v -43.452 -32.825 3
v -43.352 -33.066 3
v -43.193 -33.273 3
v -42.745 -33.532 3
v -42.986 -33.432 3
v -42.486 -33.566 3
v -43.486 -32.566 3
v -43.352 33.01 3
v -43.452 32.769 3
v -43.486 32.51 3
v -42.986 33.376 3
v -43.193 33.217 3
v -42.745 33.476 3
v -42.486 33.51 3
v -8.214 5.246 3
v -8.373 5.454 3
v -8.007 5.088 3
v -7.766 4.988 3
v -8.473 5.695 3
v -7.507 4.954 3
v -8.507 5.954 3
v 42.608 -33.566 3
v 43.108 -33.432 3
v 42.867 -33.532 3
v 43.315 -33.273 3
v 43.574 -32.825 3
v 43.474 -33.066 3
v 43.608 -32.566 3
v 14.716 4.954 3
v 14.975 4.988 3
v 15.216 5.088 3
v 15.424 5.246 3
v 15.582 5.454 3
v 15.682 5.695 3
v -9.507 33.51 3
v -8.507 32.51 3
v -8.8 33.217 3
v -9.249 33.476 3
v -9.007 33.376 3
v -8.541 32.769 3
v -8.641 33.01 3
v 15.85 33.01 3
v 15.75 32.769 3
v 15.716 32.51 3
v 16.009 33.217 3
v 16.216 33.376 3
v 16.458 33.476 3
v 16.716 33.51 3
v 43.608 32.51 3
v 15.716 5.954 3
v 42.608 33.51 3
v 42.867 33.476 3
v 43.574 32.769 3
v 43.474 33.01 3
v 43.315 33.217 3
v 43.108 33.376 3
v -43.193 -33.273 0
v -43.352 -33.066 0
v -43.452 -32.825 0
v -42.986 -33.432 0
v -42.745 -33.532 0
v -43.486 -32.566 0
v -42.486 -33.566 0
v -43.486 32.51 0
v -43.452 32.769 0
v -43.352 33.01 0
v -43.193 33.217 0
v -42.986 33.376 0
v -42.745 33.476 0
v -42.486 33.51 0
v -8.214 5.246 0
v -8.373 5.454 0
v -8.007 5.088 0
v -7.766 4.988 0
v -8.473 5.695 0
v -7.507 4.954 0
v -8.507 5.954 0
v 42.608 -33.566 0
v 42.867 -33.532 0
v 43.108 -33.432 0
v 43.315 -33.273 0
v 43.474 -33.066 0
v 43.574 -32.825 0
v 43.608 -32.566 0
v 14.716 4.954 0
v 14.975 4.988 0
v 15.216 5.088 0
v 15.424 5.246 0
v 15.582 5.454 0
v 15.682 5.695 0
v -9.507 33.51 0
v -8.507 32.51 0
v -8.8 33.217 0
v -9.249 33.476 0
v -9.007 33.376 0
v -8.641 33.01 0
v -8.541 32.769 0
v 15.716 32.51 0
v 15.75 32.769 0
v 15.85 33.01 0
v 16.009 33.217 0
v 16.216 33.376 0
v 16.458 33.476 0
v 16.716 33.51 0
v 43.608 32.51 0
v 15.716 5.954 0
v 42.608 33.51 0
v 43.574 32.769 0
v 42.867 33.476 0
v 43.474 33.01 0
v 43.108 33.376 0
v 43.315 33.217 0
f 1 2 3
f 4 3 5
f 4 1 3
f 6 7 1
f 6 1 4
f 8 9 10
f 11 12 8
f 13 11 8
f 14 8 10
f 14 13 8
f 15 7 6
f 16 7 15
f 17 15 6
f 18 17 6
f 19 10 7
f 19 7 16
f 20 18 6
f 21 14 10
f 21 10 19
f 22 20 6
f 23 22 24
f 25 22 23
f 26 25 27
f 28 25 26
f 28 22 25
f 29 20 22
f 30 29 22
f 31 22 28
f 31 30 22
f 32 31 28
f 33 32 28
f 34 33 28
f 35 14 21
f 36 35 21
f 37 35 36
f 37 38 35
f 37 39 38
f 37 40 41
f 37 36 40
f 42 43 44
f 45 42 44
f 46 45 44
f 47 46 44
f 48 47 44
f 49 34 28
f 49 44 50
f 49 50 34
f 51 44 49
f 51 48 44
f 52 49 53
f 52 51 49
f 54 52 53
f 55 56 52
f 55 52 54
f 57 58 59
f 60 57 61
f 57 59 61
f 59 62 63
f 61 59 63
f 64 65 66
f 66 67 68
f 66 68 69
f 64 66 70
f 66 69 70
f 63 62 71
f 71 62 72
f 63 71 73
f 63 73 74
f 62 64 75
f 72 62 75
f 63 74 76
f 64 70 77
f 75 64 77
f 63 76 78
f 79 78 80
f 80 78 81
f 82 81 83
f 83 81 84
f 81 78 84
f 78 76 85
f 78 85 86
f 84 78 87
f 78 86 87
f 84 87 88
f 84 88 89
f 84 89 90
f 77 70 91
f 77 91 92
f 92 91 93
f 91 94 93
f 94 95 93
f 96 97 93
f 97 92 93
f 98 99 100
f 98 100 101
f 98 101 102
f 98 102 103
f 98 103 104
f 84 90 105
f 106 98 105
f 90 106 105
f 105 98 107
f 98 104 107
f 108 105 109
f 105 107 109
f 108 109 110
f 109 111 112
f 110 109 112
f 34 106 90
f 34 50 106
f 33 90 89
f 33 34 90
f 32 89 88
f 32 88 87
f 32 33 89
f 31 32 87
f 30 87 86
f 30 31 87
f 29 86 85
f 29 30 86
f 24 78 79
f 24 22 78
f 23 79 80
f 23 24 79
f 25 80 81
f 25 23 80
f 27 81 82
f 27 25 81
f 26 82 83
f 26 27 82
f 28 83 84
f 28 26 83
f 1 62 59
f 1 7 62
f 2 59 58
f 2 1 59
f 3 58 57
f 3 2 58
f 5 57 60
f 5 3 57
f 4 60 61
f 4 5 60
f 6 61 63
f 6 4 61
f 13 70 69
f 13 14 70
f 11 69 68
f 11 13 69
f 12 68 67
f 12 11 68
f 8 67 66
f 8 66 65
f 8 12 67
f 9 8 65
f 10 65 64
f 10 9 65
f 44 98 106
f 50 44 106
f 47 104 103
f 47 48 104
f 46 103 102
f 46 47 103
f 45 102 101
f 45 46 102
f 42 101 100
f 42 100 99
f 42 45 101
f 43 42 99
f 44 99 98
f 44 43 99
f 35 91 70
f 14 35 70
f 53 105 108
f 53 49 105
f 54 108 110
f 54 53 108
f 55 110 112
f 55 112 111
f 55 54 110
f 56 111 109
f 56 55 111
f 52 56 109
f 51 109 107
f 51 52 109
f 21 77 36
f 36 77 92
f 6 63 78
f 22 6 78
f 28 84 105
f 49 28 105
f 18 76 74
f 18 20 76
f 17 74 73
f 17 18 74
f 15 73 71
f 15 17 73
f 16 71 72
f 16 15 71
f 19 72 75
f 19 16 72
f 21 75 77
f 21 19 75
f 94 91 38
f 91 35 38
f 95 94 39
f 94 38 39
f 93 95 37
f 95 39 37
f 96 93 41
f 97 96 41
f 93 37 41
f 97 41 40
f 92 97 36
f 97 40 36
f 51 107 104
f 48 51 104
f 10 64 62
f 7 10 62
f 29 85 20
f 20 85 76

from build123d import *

# Parameters (mm, degrees)
RESSALTO_EXTRUS_O1_DEPTH = 3
FILETE1_R                = 1


with BuildPart() as part:
    # Esboço1 → Ressalto-extrusão1 (new body)
    with BuildSketch(Plane.XY):
        Polygon((-8.50739043, 33.509840055), (-43.485746942, 33.509840055), (-43.485746942, -33.566083295), (43.608248957, -33.566083295), (43.608248957, 33.509840055), (15.716409294, 33.509840055), (15.716409294, 4.953578222), (-8.50739043, 4.953578222), align=None)
    extrude(amount=RESSALTO_EXTRUS_O1_DEPTH)

    # Filete1
    filete1_edges = [part.edges().sort_by_distance(p)[0] for p in [
        (43.608248957, -33.566083295, 1.5),
        (-43.485746942, -33.566083295, 1.5),
        (-43.485746942, 33.509840055, 1.5),
        (-8.50739043, 33.509840055, 1.5),
        (-8.50739043, 4.953578222, 1.5),
        (15.716409294, 4.953578222, 1.5),
        (15.716409294, 33.509840055, 1.5),
        (43.608248957, 33.509840055, 1.5),
    ]]
    fillet(filete1_edges, radius=FILETE1_R)


solid = part.part
